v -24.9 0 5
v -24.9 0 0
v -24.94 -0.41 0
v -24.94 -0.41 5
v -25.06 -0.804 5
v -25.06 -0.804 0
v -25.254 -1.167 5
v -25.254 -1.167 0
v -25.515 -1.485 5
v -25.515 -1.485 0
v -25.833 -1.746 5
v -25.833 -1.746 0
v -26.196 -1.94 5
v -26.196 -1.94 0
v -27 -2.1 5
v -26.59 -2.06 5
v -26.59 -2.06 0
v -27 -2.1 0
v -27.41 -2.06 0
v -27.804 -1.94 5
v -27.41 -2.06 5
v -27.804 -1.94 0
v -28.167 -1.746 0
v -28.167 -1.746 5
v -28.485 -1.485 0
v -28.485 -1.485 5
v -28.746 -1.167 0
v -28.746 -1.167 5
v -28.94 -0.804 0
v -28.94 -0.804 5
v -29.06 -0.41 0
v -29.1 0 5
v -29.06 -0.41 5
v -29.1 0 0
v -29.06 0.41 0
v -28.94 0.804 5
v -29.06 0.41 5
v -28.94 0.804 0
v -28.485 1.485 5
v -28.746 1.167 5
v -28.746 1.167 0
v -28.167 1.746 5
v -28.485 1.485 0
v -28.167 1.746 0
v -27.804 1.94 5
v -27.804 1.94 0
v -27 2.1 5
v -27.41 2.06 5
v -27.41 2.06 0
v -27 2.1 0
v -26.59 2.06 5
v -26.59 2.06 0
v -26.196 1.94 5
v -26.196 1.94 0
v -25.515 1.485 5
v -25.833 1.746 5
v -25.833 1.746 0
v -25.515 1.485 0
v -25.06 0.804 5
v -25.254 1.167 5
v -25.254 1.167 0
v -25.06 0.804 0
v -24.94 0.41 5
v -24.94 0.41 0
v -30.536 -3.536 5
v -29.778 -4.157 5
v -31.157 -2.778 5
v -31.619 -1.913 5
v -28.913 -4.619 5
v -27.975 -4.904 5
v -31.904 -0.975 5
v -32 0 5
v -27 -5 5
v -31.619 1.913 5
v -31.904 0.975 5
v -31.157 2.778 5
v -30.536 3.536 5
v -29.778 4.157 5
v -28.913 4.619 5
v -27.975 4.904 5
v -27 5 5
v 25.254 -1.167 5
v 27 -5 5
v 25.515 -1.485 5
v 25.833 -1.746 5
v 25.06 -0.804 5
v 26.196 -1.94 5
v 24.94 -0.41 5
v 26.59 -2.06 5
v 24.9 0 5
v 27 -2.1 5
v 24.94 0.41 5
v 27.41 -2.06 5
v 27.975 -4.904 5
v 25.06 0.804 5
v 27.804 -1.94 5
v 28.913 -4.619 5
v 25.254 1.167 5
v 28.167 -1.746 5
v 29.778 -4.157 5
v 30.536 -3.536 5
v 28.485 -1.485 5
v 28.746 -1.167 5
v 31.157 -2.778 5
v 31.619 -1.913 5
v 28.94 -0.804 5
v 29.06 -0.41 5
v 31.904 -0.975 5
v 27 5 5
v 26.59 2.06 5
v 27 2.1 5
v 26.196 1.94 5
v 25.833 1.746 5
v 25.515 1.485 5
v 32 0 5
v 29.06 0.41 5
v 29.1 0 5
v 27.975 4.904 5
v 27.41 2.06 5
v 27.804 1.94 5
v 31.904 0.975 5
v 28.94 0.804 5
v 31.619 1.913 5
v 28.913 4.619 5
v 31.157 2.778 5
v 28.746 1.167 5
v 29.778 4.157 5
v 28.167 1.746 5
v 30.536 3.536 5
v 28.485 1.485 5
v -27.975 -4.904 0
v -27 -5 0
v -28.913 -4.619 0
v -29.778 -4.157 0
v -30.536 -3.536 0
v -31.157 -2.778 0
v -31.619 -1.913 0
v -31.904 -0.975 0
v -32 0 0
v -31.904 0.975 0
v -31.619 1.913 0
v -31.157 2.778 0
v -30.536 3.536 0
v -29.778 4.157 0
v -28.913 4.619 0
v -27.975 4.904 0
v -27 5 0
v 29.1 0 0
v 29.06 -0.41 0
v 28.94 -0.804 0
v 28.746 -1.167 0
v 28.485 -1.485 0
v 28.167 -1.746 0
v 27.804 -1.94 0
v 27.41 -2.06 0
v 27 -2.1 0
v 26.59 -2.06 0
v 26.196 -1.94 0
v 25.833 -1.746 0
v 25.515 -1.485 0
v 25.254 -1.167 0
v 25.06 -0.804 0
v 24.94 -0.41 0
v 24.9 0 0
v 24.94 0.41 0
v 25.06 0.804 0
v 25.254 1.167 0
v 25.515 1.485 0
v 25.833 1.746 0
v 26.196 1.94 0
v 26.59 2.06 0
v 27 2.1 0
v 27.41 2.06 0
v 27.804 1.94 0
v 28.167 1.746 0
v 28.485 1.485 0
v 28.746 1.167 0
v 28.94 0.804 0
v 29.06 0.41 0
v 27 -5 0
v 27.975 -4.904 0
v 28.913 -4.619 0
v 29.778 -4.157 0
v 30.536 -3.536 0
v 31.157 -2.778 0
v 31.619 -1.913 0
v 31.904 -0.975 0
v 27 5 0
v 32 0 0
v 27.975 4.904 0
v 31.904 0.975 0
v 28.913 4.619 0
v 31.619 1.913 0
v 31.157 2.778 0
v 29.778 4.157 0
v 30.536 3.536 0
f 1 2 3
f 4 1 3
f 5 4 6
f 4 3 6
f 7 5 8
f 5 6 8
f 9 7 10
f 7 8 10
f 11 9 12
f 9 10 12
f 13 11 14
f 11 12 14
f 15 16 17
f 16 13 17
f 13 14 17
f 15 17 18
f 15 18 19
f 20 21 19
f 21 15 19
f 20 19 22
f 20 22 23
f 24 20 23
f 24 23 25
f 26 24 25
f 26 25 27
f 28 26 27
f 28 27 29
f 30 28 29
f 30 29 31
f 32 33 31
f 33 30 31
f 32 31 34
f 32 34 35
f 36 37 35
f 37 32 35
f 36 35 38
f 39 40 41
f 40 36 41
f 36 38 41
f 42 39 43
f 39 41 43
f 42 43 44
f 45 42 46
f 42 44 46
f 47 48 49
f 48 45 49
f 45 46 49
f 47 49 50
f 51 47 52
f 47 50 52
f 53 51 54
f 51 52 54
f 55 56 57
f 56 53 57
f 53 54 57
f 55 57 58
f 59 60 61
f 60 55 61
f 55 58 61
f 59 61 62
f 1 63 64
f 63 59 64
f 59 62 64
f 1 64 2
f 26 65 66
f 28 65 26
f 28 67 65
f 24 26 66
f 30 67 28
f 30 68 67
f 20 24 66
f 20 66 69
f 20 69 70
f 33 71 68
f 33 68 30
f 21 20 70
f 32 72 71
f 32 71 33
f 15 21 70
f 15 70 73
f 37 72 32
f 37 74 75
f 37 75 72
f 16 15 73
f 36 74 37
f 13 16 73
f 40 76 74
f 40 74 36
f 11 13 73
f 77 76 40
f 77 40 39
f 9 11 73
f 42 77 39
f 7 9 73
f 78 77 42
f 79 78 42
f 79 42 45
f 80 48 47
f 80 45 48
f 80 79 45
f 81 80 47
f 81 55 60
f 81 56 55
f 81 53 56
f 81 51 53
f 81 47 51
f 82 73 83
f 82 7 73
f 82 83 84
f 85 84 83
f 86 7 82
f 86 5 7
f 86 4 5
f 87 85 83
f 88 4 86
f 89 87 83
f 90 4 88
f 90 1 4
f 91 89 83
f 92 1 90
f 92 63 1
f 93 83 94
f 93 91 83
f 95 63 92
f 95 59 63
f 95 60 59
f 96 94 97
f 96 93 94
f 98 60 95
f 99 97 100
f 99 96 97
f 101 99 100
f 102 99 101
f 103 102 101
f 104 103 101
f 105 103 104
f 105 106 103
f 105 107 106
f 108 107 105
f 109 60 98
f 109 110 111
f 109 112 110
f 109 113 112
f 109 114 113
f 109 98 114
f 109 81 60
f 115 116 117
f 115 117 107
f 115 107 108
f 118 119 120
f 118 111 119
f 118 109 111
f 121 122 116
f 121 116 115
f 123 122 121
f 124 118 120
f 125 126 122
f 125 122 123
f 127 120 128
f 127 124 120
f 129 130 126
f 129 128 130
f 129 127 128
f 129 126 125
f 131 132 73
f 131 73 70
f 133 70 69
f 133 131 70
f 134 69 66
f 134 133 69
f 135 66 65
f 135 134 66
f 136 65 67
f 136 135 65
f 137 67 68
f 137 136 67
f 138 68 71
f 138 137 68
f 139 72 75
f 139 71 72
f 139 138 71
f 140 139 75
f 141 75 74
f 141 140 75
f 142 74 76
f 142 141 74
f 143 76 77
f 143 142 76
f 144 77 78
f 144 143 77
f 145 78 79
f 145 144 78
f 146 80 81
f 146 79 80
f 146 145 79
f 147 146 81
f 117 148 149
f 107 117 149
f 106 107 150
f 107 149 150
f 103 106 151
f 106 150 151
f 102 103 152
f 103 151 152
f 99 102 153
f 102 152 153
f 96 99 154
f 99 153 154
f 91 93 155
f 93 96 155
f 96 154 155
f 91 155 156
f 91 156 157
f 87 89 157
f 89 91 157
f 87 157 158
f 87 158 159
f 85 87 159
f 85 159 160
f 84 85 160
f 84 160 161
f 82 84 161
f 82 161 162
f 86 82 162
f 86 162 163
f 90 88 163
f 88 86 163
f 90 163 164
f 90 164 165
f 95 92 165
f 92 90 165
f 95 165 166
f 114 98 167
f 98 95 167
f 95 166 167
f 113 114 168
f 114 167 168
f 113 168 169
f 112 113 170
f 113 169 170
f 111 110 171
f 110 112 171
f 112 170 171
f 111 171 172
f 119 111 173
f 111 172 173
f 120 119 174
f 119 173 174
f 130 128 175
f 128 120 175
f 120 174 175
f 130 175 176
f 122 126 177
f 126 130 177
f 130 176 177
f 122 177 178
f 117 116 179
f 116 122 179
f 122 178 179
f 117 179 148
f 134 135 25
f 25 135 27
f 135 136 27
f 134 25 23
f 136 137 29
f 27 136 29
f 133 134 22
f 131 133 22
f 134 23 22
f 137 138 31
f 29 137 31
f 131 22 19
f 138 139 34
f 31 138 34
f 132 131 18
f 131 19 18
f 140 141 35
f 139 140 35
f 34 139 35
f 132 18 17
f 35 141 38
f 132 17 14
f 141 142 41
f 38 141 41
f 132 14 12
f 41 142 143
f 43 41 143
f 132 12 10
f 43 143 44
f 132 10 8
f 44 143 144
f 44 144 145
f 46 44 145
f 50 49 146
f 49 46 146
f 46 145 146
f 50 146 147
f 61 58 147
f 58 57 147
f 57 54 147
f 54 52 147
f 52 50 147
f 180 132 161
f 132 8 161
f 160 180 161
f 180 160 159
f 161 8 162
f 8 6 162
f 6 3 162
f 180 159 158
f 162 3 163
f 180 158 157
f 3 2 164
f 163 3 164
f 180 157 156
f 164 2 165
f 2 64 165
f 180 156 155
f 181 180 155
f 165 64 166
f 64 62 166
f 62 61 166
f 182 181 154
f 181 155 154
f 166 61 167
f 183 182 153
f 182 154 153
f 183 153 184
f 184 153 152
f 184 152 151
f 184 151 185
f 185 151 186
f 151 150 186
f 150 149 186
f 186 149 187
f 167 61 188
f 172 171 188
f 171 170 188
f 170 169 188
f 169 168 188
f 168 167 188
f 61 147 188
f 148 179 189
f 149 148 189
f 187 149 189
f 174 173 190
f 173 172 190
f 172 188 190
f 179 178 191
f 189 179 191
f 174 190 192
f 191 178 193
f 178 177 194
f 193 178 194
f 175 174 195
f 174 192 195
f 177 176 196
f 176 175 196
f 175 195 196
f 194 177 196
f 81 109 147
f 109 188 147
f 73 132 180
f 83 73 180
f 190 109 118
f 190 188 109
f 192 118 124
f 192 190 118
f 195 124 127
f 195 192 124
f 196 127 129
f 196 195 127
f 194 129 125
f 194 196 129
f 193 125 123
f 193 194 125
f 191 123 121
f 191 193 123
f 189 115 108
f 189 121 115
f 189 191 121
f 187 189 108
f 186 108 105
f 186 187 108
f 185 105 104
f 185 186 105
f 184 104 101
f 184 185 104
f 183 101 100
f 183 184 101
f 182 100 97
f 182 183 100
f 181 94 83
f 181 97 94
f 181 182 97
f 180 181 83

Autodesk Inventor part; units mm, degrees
ref_plane "YZ Plane" through (0, 0, 0) normal (1, 0, 0) x (0, 1, 0)
ref_plane "XZ Plane" through (0, 0, 0) normal (0, 1, 0) x (-1, 0, 0)
ref_plane "XY Plane" through (0, 0, 0) normal (0, 0, 1) x (1, 0, 0)
sketch "Sketch1" plane through (0, 0, 0) normal (0, 0, 1) x (1, 0, 0)
  line L0 (-27, 0) -> (27, 0) construction
  line L1 (-27, -5) -> (27, -5)
  line L2 (27, 5) -> (-27, 5)
  arc A0 (-27, 5) -> (-27, -5) centre (-27, 0) ccw
  arc A1 (27, -5) -> (27, 5) centre (27, 0) ccw
  circle A2 centre (-27, 0) radius 2.1
  circle A3 centre (27, 0) radius 2.1
  point P0 (0, 0)
  point P1 (0, 0)
  point P2 (32, 0)
  dimension "d0" = 5
  dimension "d1" = 4.2
  dimension "d2" = 4.2
  dimension "d3" = 54
extrude "Extrusion1" add sketch "Sketch1" along normal blind 5
properties part number "gate-anchor-link"
